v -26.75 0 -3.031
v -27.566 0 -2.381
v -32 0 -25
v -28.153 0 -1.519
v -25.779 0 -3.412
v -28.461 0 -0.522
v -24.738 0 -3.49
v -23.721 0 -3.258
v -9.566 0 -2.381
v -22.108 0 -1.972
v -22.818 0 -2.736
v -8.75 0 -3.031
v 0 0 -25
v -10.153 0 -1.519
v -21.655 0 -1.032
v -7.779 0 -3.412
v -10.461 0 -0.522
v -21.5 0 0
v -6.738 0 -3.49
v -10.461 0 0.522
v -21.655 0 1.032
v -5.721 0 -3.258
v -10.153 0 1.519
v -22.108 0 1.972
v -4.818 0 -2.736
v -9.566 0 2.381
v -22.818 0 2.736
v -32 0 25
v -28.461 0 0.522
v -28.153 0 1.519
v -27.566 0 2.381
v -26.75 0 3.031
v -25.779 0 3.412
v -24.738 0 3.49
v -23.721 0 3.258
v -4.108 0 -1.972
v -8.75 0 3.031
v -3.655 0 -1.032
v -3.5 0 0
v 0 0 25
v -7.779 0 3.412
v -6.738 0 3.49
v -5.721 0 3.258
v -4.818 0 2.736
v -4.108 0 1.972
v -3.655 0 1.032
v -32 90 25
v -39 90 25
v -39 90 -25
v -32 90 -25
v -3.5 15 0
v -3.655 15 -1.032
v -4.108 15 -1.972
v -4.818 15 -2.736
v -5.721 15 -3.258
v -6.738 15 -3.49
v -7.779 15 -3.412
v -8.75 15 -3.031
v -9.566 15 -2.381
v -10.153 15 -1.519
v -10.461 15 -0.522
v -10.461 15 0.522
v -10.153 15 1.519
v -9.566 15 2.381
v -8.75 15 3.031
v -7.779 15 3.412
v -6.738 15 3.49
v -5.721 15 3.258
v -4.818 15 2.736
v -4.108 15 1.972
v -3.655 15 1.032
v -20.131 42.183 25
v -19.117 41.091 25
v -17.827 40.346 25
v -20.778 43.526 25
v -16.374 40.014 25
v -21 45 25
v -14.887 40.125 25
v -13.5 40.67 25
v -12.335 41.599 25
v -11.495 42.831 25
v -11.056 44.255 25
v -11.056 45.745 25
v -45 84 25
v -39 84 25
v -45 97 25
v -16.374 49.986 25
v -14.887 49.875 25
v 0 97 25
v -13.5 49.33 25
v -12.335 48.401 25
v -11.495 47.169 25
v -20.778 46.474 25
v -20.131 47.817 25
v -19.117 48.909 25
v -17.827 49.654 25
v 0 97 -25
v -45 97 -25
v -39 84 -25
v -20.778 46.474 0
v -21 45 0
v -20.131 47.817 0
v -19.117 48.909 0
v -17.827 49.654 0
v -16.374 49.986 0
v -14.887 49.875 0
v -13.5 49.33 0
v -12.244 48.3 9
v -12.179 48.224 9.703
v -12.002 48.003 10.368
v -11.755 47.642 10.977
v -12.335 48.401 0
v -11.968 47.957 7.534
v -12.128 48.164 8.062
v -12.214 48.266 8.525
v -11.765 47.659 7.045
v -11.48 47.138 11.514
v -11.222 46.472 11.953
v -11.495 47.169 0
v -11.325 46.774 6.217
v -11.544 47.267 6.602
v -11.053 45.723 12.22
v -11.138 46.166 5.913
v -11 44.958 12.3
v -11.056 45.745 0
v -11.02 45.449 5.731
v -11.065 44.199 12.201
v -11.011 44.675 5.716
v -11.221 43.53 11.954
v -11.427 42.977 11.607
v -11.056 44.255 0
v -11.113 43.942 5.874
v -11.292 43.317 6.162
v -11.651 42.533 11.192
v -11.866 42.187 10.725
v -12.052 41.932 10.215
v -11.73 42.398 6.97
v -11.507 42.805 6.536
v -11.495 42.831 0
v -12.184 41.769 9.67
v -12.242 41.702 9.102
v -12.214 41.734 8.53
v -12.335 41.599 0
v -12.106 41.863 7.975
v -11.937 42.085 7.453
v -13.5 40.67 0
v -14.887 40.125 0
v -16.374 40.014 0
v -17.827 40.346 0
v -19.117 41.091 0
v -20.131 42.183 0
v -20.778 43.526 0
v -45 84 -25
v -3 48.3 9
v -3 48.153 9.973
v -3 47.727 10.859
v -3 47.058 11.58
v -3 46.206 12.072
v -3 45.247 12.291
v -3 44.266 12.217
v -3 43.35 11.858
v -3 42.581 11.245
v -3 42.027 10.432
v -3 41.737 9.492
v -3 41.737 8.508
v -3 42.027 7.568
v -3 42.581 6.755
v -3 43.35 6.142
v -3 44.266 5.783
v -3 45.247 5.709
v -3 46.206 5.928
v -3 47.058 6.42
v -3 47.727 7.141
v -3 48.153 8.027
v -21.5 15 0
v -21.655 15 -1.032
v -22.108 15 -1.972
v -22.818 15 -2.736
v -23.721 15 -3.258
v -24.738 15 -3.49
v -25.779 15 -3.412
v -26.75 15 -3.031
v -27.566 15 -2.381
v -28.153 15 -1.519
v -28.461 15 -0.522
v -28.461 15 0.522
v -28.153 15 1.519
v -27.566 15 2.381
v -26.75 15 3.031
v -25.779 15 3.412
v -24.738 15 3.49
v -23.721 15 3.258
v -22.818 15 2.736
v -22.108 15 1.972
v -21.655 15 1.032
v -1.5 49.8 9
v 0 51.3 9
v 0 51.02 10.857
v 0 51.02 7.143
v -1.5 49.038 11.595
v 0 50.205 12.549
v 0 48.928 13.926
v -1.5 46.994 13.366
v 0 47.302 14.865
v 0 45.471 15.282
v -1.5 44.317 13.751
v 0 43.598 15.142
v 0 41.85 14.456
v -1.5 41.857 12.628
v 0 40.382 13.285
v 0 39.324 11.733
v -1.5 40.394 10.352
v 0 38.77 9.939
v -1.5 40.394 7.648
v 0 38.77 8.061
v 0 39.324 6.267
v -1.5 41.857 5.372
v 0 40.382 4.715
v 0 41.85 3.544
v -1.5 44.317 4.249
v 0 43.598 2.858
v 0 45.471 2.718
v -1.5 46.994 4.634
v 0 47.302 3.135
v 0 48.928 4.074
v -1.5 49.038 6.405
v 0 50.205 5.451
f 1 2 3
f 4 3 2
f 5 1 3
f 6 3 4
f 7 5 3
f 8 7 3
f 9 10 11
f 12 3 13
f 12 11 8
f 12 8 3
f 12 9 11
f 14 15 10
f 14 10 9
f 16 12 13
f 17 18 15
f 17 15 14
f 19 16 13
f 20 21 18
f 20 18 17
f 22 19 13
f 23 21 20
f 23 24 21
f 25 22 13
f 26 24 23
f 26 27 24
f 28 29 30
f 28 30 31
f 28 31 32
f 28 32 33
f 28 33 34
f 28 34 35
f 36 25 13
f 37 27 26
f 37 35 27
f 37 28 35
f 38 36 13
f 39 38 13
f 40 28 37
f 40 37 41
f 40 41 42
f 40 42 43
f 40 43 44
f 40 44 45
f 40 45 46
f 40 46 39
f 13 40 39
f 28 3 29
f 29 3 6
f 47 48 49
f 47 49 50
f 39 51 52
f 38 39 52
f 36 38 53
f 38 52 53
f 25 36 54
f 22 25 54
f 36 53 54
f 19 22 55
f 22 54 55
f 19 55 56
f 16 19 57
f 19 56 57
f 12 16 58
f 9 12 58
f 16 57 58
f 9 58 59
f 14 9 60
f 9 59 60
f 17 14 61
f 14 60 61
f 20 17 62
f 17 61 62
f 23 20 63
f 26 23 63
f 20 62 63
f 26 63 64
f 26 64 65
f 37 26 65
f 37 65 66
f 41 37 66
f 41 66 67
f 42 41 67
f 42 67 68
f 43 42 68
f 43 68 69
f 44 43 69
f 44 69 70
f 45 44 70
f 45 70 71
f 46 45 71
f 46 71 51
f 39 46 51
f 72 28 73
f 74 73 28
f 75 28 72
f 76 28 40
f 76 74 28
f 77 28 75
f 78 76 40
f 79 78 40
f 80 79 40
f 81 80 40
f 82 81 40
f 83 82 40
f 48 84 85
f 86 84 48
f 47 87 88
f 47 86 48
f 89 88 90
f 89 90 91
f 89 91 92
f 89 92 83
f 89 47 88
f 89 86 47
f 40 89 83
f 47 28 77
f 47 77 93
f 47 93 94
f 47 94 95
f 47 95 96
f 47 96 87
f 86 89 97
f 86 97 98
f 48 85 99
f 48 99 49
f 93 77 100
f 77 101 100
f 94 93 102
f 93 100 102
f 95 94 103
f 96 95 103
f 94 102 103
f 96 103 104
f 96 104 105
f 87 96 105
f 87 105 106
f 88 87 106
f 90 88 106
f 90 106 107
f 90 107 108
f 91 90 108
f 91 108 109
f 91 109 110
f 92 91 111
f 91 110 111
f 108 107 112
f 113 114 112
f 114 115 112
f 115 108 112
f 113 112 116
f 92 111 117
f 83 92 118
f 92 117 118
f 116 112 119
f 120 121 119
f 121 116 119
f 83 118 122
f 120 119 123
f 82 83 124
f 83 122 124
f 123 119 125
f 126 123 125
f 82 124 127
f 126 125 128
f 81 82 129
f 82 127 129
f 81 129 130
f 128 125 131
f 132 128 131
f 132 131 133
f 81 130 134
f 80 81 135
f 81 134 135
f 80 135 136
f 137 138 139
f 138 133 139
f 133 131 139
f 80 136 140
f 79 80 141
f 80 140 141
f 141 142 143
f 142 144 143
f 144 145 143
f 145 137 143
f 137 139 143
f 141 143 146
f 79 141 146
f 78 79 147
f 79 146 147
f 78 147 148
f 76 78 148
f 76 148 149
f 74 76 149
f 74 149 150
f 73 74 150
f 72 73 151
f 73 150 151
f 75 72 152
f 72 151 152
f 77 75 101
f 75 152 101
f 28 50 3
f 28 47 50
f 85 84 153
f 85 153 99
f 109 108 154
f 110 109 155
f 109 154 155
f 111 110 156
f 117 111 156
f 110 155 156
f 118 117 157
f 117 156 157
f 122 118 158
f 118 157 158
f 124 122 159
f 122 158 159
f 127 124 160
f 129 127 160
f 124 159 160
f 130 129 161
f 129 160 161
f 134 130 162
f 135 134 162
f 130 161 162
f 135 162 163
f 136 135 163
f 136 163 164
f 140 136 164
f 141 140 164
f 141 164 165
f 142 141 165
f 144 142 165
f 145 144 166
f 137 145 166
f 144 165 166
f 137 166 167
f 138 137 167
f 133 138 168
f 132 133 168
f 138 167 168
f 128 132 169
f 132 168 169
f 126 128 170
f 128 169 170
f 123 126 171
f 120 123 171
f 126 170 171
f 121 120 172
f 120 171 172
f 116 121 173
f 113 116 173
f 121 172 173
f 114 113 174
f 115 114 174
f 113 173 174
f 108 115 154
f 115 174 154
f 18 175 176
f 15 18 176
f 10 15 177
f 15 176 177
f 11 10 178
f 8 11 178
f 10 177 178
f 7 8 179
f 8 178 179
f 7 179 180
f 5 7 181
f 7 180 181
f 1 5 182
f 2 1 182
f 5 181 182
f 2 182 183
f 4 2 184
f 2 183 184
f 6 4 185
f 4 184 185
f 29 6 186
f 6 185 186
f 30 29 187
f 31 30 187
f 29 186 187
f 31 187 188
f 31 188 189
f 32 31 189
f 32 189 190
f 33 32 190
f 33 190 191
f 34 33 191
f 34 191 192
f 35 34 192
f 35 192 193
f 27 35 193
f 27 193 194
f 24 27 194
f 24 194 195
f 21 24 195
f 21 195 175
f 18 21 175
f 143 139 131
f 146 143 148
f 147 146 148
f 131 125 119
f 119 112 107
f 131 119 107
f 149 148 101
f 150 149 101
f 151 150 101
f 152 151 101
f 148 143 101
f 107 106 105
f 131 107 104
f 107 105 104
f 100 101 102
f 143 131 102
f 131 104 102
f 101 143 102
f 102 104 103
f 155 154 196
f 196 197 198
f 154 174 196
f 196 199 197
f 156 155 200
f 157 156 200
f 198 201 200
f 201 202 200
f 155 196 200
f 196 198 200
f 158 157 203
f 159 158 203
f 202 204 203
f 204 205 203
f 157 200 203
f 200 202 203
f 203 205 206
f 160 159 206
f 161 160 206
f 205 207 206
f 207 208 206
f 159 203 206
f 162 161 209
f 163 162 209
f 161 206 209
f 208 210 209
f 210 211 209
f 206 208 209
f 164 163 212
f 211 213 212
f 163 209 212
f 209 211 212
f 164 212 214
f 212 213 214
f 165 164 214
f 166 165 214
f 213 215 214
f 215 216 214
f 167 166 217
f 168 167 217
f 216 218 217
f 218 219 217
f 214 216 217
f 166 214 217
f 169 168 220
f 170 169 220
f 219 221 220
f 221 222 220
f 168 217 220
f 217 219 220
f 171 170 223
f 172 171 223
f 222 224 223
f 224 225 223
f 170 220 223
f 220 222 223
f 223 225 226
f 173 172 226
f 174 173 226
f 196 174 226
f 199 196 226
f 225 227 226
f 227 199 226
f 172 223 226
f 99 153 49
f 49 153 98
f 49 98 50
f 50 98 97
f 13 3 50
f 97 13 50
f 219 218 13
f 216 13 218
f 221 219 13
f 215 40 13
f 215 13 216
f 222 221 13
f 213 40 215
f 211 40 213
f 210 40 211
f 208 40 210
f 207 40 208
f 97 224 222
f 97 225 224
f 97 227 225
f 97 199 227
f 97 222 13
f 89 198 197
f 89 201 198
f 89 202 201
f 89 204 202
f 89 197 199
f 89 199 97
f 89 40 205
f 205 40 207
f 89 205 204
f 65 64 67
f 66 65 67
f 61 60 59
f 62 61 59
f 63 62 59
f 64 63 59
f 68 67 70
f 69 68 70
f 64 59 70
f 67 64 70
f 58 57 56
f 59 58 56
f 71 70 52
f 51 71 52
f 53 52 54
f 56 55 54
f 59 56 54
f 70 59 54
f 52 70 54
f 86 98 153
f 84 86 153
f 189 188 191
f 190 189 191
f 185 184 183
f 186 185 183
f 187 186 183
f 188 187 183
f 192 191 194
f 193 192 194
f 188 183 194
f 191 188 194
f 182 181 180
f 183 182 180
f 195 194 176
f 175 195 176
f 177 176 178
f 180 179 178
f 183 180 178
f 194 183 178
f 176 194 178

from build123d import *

# Parameters (mm, degrees)
BOSS_EXTRUDE1_DEPTH       = 25
F_1_0MM_DOWEL_HOLE1_D     = 10
F_1_0MM_DOWEL_HOLE1_DEPTH = 25
M8X1_0_TAPPED_HOLE1_D     = 7
M8X1_0_TAPPED_HOLE1_DEPTH = 15


# Read off the part's stored shape, not the designer's step: CSK for M6 Flat Head Machine Screw1
with BuildPart() as part:
    # Sketch1 → Boss-Extrude1 (new, symmetric)
    with BuildSketch(Plane.XY):
        Polygon((0, 0), (0, 97), (-45, 97), (-45, 84), (-39, 84), (-39, 90), (-32, 90), (-32, 0), align=None)
    extrude(amount=BOSS_EXTRUDE1_DEPTH, both=True)

    # Ø1.0mm Dowel Hole1
    with Locations(Plane.XY.offset(25)):
        with Locations((-16, 45)):
            Hole(F_1_0MM_DOWEL_HOLE1_D / 2, depth=F_1_0MM_DOWEL_HOLE1_DEPTH)

    # M8x1.0 Tapped Hole1
    with Locations(Plane(origin=(0, 0, 0), x_dir=(-1, 0, 0), z_dir=(0, -1, 0))):
        with Locations((7, 0), (25, 0)):
            Hole(M8X1_0_TAPPED_HOLE1_D / 2, depth=M8X1_0_TAPPED_HOLE1_DEPTH)

    # CSK for M6 Flat Head Machine Screw1 outl → CSK for M6 Flat Head Machine Screw1 (revolve, cut)
    with BuildSketch(Plane(origin=(0, 45, 9), x_dir=(0, 1, 0), z_dir=(0, 0, -1))):
        Polygon((0, -12.244302381), (3.3, -12.244302381), (3.3, -3), (6.3, 0), (0, 0), align=None)
    revolve(axis=Axis((0, 45, 9), (1, 0, 0)), mode=Mode.SUBTRACT)


solid = part.part
